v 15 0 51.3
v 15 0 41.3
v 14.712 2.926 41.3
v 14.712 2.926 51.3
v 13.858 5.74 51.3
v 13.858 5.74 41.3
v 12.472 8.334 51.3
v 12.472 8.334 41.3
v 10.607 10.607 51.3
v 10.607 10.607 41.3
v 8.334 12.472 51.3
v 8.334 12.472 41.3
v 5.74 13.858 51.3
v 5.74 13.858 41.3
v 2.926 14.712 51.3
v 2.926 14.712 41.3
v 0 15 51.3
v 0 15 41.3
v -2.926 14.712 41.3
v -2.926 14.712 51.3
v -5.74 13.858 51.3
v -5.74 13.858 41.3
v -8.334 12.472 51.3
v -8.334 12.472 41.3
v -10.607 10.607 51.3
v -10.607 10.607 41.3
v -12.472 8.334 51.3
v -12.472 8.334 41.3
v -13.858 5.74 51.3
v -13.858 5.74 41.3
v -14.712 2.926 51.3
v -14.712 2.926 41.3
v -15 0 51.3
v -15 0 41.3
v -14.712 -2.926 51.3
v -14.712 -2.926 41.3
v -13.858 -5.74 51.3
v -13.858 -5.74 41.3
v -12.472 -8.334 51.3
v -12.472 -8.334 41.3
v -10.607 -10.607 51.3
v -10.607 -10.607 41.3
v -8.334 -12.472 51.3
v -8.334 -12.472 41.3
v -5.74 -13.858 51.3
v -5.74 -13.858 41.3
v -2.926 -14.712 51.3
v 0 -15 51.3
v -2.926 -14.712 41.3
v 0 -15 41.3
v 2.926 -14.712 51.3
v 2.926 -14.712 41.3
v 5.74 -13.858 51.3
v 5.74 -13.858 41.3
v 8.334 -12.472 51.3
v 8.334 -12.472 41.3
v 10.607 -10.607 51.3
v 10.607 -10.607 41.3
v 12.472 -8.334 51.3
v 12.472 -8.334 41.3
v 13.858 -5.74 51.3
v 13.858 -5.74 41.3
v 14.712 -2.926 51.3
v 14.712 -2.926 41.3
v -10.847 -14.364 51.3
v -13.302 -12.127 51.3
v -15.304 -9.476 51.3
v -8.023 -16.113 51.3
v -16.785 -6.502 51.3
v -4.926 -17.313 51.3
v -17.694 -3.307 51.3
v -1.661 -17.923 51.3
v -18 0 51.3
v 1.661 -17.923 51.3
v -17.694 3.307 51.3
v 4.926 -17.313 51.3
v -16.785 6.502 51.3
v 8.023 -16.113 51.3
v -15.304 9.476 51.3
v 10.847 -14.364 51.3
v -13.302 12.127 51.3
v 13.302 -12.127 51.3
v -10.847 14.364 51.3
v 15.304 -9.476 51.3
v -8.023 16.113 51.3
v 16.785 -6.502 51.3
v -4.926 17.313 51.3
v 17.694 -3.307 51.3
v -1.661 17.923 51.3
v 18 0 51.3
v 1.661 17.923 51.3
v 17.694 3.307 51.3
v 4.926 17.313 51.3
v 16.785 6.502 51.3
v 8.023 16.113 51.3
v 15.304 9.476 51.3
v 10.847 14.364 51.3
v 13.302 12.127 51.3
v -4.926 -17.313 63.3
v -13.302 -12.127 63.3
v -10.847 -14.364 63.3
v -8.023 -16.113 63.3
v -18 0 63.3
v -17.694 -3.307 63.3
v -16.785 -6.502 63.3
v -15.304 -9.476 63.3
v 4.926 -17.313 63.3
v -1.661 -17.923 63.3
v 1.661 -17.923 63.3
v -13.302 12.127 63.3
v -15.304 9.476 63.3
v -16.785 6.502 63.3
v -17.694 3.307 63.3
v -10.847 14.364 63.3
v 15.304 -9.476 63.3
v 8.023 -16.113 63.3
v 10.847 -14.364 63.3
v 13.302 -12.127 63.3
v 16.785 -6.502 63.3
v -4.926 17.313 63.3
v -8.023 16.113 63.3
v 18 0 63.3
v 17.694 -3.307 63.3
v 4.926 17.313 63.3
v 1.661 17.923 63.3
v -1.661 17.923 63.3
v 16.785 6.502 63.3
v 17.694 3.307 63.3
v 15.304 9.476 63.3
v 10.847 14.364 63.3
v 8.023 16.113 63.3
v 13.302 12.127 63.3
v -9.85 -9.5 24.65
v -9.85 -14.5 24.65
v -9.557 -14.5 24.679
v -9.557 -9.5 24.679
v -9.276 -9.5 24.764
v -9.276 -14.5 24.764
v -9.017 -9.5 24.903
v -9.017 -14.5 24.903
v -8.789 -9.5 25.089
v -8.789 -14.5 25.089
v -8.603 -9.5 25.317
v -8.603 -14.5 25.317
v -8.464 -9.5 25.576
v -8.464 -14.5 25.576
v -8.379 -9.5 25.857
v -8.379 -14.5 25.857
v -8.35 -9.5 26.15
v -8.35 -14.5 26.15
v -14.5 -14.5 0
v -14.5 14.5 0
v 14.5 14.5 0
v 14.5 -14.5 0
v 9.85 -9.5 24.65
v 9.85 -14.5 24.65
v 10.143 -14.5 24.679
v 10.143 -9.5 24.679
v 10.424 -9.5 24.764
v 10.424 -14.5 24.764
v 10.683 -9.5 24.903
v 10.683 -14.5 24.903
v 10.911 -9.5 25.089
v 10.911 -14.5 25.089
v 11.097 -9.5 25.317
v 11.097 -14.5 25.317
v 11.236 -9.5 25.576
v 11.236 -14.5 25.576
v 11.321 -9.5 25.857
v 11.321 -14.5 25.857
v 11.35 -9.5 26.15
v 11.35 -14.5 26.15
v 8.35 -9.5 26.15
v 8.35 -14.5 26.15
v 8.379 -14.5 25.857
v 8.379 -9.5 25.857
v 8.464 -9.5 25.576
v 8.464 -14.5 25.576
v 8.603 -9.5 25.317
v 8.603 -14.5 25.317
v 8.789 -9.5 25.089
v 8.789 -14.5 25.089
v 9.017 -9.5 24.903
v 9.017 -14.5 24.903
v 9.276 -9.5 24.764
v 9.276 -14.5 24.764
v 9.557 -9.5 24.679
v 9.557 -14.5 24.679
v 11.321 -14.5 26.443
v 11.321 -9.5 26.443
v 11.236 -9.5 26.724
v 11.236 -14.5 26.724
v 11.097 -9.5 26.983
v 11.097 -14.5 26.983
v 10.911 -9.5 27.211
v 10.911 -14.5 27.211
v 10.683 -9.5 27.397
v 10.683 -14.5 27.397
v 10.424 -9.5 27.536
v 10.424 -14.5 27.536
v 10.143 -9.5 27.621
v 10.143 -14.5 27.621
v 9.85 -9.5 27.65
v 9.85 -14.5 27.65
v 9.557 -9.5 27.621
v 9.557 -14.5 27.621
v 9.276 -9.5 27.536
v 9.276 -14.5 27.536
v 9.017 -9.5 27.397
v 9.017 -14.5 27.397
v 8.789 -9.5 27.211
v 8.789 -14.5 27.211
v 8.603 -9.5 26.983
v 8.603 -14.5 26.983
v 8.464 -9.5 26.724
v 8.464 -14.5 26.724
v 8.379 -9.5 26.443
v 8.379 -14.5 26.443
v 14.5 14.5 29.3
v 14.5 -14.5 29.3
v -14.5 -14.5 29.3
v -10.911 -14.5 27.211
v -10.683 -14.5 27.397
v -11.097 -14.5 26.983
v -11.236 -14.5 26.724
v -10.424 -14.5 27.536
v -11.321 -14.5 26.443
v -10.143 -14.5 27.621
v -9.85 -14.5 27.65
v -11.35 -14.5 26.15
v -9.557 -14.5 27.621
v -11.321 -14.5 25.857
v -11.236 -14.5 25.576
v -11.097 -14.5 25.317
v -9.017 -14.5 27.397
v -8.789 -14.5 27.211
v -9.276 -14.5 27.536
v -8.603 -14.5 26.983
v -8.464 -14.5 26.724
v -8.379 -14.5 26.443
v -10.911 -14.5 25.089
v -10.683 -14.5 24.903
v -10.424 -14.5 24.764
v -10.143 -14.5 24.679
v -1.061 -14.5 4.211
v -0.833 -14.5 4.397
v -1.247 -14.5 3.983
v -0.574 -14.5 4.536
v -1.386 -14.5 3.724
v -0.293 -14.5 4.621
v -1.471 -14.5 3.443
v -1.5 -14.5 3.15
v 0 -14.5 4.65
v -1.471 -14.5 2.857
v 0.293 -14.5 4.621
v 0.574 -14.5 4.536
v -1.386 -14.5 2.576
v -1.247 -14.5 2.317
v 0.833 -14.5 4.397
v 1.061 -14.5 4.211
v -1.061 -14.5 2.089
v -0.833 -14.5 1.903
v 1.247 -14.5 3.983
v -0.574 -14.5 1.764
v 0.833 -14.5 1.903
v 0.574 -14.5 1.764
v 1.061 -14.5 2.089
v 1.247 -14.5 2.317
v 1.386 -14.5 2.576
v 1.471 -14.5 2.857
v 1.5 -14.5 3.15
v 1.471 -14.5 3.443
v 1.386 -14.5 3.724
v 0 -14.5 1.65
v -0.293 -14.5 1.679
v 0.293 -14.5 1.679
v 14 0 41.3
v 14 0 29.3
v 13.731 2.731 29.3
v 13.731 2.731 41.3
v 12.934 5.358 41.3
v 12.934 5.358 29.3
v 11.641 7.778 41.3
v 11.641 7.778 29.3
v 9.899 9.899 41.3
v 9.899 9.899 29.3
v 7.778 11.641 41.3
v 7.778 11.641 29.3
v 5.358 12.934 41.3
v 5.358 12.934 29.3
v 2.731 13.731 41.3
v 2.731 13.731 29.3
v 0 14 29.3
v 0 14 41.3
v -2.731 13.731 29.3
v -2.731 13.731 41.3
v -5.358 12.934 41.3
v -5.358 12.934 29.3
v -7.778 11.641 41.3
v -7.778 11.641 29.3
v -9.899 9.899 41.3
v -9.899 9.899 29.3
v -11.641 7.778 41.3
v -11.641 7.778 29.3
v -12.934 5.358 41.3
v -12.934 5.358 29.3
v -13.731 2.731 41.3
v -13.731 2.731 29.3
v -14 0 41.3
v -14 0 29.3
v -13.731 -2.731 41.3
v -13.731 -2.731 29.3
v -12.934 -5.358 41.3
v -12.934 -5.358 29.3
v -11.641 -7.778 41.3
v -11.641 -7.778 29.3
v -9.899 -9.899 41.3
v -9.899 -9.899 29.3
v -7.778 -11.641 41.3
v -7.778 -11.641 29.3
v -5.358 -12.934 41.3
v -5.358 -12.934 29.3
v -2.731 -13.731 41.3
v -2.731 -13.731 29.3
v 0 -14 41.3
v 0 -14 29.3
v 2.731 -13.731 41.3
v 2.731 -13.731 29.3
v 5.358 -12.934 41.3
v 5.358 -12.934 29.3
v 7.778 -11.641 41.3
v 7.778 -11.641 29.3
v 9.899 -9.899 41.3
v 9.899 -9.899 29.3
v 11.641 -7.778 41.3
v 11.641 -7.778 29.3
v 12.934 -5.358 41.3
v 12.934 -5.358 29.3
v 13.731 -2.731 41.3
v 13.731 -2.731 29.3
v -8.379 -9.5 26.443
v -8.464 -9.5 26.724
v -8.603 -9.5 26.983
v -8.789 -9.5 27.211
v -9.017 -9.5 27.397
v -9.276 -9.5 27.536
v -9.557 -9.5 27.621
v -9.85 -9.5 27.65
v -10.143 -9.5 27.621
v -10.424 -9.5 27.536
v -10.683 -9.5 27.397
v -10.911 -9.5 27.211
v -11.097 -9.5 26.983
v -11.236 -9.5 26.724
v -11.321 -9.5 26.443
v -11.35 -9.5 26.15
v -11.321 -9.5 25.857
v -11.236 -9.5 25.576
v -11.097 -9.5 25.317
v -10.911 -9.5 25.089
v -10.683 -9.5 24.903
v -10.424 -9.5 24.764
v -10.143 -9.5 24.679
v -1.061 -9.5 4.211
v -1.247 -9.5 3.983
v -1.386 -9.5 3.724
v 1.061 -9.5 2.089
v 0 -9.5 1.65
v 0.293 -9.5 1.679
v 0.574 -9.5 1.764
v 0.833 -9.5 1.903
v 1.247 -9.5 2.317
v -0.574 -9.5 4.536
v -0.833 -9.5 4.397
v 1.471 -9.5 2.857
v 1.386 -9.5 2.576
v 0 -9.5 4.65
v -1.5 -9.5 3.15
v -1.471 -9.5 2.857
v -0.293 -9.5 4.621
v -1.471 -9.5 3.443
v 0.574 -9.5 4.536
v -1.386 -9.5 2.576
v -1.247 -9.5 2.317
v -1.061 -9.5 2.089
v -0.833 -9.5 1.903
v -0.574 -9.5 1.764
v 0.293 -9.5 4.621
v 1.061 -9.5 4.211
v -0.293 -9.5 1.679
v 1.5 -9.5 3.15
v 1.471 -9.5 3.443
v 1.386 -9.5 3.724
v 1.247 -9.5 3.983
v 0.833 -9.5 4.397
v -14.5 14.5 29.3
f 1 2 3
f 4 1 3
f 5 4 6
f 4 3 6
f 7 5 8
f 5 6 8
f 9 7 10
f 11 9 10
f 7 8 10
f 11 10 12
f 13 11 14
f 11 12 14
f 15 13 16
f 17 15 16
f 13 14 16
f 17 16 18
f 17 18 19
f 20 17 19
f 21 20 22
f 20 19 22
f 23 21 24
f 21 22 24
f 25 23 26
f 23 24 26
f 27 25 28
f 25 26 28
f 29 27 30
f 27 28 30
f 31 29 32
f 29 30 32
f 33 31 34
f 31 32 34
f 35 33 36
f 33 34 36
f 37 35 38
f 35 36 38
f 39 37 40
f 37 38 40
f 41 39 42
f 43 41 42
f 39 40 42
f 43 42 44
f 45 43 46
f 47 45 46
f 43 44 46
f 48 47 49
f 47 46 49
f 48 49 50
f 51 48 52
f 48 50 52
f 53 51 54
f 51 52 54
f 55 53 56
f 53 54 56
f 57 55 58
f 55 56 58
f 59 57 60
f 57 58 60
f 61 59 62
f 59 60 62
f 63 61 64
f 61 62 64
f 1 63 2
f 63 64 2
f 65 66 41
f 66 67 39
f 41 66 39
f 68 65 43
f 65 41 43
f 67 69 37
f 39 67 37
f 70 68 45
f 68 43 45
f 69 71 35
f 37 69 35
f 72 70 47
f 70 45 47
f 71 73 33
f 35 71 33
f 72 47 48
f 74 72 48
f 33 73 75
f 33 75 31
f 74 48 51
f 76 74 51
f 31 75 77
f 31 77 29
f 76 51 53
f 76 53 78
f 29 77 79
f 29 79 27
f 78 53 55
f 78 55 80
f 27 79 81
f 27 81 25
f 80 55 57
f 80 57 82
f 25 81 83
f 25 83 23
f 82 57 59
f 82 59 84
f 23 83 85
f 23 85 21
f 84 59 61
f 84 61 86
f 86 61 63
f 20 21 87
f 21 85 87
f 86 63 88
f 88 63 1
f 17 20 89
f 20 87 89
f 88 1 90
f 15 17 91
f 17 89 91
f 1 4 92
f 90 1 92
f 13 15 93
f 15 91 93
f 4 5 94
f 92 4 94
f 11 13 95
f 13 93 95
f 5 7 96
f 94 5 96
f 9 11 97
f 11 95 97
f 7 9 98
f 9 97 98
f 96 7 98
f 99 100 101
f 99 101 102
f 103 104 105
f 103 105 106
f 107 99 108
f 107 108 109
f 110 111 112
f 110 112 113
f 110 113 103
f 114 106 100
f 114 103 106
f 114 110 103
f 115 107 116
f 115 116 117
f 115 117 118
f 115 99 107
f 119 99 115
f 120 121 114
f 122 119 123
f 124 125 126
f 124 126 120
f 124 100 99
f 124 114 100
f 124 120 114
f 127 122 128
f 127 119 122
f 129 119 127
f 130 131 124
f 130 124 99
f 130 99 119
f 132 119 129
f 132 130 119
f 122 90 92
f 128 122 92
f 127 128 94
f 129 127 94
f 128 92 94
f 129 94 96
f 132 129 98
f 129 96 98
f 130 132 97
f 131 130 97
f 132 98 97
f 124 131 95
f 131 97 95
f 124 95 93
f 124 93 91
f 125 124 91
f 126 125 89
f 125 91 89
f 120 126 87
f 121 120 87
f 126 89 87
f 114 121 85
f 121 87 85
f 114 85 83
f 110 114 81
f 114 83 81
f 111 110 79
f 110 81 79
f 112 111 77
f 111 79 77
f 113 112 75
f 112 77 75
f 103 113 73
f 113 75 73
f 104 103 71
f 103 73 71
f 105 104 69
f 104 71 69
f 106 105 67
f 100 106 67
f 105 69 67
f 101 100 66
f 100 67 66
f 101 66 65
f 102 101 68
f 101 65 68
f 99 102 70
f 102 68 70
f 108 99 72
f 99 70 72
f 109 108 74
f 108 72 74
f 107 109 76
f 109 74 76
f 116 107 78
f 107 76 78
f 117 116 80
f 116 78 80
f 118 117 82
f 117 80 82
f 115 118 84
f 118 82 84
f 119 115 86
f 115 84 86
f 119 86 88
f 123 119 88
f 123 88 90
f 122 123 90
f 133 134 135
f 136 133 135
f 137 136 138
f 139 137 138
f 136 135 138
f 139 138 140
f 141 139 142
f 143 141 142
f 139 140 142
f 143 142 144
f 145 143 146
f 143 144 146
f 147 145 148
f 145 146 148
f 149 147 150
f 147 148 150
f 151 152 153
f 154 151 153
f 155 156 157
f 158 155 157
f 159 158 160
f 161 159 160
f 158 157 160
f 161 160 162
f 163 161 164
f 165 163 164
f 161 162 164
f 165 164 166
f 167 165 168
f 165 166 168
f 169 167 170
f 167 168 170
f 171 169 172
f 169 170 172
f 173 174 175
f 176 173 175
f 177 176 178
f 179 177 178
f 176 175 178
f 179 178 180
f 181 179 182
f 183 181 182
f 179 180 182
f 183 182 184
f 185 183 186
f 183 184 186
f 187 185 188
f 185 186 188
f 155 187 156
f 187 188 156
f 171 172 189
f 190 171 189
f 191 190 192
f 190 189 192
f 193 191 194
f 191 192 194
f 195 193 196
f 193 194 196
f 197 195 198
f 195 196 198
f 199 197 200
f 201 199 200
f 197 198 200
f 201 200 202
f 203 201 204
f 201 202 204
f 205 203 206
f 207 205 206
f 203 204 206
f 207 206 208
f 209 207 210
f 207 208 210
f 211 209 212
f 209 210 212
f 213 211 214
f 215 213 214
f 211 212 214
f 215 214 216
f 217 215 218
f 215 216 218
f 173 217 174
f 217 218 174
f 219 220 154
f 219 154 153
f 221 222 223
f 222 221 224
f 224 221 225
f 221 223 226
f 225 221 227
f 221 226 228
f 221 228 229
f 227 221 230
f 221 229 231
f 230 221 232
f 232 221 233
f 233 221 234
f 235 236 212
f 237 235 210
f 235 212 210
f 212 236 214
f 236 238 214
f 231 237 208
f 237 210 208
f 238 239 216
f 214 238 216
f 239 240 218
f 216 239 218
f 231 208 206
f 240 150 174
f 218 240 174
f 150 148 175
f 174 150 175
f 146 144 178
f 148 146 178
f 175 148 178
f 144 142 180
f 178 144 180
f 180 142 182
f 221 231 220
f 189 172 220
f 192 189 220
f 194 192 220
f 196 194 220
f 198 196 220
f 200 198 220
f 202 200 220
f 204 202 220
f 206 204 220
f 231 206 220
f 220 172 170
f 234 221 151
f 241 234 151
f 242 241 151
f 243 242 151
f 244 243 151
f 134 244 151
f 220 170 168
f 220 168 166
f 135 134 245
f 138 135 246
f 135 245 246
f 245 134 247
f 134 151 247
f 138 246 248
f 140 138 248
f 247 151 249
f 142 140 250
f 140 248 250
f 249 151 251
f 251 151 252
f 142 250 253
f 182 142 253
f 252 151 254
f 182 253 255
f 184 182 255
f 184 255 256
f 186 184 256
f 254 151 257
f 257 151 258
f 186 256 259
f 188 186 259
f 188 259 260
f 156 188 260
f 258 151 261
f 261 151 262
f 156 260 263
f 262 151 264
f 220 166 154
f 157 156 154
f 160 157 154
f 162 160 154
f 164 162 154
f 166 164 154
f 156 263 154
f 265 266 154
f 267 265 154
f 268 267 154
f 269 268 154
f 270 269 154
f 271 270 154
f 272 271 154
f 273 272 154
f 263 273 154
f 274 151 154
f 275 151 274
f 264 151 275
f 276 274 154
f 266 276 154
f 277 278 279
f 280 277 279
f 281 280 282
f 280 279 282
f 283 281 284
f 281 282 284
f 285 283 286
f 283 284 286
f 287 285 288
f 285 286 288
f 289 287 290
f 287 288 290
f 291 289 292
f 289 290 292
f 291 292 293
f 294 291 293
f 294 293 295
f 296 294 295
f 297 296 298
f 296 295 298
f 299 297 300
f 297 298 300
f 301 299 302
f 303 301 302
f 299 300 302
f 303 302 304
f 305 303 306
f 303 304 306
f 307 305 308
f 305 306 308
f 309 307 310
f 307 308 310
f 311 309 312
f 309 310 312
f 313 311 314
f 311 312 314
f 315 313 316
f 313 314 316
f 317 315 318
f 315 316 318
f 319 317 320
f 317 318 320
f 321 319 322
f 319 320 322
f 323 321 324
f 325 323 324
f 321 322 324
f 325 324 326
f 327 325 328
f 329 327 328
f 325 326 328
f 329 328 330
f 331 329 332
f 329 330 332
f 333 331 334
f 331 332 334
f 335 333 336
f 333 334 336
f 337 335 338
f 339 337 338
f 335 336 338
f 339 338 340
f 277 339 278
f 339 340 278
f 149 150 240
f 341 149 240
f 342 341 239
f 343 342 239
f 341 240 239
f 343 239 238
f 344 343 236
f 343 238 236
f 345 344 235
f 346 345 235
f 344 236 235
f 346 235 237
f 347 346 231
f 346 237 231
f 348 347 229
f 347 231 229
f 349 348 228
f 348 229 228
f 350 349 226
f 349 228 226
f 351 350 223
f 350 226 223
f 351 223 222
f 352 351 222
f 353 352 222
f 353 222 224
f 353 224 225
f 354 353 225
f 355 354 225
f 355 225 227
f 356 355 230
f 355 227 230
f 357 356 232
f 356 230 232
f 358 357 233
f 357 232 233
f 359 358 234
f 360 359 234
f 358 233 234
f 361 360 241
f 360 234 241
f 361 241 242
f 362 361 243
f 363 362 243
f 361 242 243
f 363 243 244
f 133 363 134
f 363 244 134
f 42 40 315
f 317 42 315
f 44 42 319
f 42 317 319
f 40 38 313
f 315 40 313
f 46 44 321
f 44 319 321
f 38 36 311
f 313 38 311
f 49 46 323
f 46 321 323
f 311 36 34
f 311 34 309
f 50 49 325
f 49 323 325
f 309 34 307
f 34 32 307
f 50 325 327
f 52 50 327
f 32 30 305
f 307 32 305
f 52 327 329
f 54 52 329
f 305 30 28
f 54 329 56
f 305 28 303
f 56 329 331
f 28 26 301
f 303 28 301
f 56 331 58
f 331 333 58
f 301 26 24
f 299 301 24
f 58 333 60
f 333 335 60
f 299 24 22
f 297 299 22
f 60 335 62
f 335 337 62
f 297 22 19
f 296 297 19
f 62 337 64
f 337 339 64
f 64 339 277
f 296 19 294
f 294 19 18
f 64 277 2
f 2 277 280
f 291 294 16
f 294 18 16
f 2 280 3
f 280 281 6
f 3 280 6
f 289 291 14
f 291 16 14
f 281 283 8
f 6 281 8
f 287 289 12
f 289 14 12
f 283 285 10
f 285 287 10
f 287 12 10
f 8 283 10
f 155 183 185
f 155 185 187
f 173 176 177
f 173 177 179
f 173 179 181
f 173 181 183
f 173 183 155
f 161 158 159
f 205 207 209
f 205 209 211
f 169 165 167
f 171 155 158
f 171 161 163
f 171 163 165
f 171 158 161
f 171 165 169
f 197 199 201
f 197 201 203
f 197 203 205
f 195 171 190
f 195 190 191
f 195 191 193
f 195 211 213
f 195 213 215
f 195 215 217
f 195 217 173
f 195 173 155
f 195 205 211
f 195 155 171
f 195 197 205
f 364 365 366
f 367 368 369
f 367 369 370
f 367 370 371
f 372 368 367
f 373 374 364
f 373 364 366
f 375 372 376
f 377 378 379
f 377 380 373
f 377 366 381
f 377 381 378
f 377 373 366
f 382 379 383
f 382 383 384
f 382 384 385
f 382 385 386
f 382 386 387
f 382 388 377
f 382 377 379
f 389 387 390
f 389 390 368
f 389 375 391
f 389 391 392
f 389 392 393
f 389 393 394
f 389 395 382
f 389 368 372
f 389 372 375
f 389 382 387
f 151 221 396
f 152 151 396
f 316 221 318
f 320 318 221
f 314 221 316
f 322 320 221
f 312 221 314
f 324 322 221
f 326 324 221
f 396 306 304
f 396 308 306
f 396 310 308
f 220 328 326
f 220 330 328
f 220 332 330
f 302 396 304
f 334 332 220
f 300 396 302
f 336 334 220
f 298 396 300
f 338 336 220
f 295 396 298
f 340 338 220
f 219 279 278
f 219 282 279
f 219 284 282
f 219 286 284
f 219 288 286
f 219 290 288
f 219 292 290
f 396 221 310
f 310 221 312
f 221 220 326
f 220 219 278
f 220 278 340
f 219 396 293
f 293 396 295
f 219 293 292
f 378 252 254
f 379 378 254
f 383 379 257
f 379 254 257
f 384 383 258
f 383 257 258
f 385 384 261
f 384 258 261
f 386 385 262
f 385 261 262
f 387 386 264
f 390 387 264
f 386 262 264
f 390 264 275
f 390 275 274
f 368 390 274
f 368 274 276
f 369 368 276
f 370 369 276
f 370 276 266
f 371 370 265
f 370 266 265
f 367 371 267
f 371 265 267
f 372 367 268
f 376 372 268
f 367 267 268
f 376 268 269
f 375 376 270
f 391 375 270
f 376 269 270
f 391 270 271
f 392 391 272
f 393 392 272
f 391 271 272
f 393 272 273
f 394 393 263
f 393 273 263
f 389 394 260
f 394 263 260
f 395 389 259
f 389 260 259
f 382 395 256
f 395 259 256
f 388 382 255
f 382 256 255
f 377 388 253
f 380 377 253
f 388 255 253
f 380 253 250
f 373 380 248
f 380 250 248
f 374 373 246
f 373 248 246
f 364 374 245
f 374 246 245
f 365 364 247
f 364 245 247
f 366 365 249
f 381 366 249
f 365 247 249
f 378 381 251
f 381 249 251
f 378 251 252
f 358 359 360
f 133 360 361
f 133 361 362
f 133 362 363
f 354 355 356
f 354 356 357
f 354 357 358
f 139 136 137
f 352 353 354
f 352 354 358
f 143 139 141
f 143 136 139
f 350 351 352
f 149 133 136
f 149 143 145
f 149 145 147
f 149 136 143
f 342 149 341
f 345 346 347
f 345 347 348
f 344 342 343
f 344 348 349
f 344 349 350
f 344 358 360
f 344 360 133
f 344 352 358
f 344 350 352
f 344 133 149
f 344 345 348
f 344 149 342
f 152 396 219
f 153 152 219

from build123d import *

# Parameters (mm, degrees)
SKETCH_3_W          = 29
SKETCH_3_H          = 29
EXTRUDE_2_DEPTH     = 29.3
SKETCH_4_R          = 14
EXTRUDE_3_DEPTH     = 12
SKETCH_5_R          = 15
EXTRUDE_4_DEPTH     = 10
SKETCH_6_R          = 18
EXTRUDE_5_DEPTH     = 12
CUT_EXTRUDE_1_DEPTH = 5


with BuildPart() as part:
    # 草图3 → 凸台-拉伸2 (new body)
    with BuildSketch(Plane.XY):
        Rectangle(SKETCH_3_W, SKETCH_3_H)
    extrude(amount=EXTRUDE_2_DEPTH)

    # 草图4 → 凸台-拉伸3 (add)
    with BuildSketch(Plane.XY.offset(29.3)):
        Circle(SKETCH_4_R)
    extrude(amount=EXTRUDE_3_DEPTH)

    # 草图5 → 凸台-拉伸4 (add)
    with BuildSketch(Plane.XY.offset(41.3)):
        Circle(SKETCH_5_R)
    extrude(amount=EXTRUDE_4_DEPTH)

    # 草图6 → 凸台-拉伸5 (add)
    with BuildSketch(Plane.XY.offset(51.3)):
        Circle(SKETCH_6_R)
    extrude(amount=EXTRUDE_5_DEPTH)

    # 草图7 → 切除-拉伸1 (cut)
    with BuildSketch(Plane.XZ.offset(14.5)):
        with BuildLine():
            Line((-9.85, 24.65), (-9.85, 26.15))
            Line((-9.85, 26.15), (-8.35, 26.15))
            ThreePointArc((-8.35, 26.15), (-10.910660172, 27.210660172), (-9.85, 24.65))
        make_face()
        with BuildLine():
            Line((-8.35, 26.15), (-9.85, 26.15))
            Line((-9.85, 26.15), (-9.85, 24.65))
            ThreePointArc((-9.85, 24.65), (-8.789339828, 25.089339828), (-8.35, 26.15))
        make_face()
        with BuildLine():
            ThreePointArc((11.35, 26.15), (9.85, 27.65), (8.35, 26.15))
            Line((8.35, 26.15), (9.85, 26.15))
            Line((9.85, 26.15), (9.85, 24.65))
            ThreePointArc((9.85, 24.65), (10.910660172, 25.089339828), (11.35, 26.15))
        make_face()
        with BuildLine():
            Line((9.85, 26.15), (8.35, 26.15))
            ThreePointArc((8.35, 26.15), (8.789339828, 25.089339828), (9.85, 24.65))
            Line((9.85, 24.65), (9.85, 26.15))
        make_face()
        with BuildLine():
            ThreePointArc((1.5, 3.15), (0, 4.65), (-1.5, 3.15))
            Line((-1.5, 3.15), (1.5, 3.15))
        make_face()
        with BuildLine():
            Line((1.5, 3.15), (-1.5, 3.15))
            ThreePointArc((-1.5, 3.15), (0, 1.65), (1.5, 3.15))
        make_face()
    extrude(amount=-CUT_EXTRUDE_1_DEPTH, mode=Mode.SUBTRACT)


solid = part.part
